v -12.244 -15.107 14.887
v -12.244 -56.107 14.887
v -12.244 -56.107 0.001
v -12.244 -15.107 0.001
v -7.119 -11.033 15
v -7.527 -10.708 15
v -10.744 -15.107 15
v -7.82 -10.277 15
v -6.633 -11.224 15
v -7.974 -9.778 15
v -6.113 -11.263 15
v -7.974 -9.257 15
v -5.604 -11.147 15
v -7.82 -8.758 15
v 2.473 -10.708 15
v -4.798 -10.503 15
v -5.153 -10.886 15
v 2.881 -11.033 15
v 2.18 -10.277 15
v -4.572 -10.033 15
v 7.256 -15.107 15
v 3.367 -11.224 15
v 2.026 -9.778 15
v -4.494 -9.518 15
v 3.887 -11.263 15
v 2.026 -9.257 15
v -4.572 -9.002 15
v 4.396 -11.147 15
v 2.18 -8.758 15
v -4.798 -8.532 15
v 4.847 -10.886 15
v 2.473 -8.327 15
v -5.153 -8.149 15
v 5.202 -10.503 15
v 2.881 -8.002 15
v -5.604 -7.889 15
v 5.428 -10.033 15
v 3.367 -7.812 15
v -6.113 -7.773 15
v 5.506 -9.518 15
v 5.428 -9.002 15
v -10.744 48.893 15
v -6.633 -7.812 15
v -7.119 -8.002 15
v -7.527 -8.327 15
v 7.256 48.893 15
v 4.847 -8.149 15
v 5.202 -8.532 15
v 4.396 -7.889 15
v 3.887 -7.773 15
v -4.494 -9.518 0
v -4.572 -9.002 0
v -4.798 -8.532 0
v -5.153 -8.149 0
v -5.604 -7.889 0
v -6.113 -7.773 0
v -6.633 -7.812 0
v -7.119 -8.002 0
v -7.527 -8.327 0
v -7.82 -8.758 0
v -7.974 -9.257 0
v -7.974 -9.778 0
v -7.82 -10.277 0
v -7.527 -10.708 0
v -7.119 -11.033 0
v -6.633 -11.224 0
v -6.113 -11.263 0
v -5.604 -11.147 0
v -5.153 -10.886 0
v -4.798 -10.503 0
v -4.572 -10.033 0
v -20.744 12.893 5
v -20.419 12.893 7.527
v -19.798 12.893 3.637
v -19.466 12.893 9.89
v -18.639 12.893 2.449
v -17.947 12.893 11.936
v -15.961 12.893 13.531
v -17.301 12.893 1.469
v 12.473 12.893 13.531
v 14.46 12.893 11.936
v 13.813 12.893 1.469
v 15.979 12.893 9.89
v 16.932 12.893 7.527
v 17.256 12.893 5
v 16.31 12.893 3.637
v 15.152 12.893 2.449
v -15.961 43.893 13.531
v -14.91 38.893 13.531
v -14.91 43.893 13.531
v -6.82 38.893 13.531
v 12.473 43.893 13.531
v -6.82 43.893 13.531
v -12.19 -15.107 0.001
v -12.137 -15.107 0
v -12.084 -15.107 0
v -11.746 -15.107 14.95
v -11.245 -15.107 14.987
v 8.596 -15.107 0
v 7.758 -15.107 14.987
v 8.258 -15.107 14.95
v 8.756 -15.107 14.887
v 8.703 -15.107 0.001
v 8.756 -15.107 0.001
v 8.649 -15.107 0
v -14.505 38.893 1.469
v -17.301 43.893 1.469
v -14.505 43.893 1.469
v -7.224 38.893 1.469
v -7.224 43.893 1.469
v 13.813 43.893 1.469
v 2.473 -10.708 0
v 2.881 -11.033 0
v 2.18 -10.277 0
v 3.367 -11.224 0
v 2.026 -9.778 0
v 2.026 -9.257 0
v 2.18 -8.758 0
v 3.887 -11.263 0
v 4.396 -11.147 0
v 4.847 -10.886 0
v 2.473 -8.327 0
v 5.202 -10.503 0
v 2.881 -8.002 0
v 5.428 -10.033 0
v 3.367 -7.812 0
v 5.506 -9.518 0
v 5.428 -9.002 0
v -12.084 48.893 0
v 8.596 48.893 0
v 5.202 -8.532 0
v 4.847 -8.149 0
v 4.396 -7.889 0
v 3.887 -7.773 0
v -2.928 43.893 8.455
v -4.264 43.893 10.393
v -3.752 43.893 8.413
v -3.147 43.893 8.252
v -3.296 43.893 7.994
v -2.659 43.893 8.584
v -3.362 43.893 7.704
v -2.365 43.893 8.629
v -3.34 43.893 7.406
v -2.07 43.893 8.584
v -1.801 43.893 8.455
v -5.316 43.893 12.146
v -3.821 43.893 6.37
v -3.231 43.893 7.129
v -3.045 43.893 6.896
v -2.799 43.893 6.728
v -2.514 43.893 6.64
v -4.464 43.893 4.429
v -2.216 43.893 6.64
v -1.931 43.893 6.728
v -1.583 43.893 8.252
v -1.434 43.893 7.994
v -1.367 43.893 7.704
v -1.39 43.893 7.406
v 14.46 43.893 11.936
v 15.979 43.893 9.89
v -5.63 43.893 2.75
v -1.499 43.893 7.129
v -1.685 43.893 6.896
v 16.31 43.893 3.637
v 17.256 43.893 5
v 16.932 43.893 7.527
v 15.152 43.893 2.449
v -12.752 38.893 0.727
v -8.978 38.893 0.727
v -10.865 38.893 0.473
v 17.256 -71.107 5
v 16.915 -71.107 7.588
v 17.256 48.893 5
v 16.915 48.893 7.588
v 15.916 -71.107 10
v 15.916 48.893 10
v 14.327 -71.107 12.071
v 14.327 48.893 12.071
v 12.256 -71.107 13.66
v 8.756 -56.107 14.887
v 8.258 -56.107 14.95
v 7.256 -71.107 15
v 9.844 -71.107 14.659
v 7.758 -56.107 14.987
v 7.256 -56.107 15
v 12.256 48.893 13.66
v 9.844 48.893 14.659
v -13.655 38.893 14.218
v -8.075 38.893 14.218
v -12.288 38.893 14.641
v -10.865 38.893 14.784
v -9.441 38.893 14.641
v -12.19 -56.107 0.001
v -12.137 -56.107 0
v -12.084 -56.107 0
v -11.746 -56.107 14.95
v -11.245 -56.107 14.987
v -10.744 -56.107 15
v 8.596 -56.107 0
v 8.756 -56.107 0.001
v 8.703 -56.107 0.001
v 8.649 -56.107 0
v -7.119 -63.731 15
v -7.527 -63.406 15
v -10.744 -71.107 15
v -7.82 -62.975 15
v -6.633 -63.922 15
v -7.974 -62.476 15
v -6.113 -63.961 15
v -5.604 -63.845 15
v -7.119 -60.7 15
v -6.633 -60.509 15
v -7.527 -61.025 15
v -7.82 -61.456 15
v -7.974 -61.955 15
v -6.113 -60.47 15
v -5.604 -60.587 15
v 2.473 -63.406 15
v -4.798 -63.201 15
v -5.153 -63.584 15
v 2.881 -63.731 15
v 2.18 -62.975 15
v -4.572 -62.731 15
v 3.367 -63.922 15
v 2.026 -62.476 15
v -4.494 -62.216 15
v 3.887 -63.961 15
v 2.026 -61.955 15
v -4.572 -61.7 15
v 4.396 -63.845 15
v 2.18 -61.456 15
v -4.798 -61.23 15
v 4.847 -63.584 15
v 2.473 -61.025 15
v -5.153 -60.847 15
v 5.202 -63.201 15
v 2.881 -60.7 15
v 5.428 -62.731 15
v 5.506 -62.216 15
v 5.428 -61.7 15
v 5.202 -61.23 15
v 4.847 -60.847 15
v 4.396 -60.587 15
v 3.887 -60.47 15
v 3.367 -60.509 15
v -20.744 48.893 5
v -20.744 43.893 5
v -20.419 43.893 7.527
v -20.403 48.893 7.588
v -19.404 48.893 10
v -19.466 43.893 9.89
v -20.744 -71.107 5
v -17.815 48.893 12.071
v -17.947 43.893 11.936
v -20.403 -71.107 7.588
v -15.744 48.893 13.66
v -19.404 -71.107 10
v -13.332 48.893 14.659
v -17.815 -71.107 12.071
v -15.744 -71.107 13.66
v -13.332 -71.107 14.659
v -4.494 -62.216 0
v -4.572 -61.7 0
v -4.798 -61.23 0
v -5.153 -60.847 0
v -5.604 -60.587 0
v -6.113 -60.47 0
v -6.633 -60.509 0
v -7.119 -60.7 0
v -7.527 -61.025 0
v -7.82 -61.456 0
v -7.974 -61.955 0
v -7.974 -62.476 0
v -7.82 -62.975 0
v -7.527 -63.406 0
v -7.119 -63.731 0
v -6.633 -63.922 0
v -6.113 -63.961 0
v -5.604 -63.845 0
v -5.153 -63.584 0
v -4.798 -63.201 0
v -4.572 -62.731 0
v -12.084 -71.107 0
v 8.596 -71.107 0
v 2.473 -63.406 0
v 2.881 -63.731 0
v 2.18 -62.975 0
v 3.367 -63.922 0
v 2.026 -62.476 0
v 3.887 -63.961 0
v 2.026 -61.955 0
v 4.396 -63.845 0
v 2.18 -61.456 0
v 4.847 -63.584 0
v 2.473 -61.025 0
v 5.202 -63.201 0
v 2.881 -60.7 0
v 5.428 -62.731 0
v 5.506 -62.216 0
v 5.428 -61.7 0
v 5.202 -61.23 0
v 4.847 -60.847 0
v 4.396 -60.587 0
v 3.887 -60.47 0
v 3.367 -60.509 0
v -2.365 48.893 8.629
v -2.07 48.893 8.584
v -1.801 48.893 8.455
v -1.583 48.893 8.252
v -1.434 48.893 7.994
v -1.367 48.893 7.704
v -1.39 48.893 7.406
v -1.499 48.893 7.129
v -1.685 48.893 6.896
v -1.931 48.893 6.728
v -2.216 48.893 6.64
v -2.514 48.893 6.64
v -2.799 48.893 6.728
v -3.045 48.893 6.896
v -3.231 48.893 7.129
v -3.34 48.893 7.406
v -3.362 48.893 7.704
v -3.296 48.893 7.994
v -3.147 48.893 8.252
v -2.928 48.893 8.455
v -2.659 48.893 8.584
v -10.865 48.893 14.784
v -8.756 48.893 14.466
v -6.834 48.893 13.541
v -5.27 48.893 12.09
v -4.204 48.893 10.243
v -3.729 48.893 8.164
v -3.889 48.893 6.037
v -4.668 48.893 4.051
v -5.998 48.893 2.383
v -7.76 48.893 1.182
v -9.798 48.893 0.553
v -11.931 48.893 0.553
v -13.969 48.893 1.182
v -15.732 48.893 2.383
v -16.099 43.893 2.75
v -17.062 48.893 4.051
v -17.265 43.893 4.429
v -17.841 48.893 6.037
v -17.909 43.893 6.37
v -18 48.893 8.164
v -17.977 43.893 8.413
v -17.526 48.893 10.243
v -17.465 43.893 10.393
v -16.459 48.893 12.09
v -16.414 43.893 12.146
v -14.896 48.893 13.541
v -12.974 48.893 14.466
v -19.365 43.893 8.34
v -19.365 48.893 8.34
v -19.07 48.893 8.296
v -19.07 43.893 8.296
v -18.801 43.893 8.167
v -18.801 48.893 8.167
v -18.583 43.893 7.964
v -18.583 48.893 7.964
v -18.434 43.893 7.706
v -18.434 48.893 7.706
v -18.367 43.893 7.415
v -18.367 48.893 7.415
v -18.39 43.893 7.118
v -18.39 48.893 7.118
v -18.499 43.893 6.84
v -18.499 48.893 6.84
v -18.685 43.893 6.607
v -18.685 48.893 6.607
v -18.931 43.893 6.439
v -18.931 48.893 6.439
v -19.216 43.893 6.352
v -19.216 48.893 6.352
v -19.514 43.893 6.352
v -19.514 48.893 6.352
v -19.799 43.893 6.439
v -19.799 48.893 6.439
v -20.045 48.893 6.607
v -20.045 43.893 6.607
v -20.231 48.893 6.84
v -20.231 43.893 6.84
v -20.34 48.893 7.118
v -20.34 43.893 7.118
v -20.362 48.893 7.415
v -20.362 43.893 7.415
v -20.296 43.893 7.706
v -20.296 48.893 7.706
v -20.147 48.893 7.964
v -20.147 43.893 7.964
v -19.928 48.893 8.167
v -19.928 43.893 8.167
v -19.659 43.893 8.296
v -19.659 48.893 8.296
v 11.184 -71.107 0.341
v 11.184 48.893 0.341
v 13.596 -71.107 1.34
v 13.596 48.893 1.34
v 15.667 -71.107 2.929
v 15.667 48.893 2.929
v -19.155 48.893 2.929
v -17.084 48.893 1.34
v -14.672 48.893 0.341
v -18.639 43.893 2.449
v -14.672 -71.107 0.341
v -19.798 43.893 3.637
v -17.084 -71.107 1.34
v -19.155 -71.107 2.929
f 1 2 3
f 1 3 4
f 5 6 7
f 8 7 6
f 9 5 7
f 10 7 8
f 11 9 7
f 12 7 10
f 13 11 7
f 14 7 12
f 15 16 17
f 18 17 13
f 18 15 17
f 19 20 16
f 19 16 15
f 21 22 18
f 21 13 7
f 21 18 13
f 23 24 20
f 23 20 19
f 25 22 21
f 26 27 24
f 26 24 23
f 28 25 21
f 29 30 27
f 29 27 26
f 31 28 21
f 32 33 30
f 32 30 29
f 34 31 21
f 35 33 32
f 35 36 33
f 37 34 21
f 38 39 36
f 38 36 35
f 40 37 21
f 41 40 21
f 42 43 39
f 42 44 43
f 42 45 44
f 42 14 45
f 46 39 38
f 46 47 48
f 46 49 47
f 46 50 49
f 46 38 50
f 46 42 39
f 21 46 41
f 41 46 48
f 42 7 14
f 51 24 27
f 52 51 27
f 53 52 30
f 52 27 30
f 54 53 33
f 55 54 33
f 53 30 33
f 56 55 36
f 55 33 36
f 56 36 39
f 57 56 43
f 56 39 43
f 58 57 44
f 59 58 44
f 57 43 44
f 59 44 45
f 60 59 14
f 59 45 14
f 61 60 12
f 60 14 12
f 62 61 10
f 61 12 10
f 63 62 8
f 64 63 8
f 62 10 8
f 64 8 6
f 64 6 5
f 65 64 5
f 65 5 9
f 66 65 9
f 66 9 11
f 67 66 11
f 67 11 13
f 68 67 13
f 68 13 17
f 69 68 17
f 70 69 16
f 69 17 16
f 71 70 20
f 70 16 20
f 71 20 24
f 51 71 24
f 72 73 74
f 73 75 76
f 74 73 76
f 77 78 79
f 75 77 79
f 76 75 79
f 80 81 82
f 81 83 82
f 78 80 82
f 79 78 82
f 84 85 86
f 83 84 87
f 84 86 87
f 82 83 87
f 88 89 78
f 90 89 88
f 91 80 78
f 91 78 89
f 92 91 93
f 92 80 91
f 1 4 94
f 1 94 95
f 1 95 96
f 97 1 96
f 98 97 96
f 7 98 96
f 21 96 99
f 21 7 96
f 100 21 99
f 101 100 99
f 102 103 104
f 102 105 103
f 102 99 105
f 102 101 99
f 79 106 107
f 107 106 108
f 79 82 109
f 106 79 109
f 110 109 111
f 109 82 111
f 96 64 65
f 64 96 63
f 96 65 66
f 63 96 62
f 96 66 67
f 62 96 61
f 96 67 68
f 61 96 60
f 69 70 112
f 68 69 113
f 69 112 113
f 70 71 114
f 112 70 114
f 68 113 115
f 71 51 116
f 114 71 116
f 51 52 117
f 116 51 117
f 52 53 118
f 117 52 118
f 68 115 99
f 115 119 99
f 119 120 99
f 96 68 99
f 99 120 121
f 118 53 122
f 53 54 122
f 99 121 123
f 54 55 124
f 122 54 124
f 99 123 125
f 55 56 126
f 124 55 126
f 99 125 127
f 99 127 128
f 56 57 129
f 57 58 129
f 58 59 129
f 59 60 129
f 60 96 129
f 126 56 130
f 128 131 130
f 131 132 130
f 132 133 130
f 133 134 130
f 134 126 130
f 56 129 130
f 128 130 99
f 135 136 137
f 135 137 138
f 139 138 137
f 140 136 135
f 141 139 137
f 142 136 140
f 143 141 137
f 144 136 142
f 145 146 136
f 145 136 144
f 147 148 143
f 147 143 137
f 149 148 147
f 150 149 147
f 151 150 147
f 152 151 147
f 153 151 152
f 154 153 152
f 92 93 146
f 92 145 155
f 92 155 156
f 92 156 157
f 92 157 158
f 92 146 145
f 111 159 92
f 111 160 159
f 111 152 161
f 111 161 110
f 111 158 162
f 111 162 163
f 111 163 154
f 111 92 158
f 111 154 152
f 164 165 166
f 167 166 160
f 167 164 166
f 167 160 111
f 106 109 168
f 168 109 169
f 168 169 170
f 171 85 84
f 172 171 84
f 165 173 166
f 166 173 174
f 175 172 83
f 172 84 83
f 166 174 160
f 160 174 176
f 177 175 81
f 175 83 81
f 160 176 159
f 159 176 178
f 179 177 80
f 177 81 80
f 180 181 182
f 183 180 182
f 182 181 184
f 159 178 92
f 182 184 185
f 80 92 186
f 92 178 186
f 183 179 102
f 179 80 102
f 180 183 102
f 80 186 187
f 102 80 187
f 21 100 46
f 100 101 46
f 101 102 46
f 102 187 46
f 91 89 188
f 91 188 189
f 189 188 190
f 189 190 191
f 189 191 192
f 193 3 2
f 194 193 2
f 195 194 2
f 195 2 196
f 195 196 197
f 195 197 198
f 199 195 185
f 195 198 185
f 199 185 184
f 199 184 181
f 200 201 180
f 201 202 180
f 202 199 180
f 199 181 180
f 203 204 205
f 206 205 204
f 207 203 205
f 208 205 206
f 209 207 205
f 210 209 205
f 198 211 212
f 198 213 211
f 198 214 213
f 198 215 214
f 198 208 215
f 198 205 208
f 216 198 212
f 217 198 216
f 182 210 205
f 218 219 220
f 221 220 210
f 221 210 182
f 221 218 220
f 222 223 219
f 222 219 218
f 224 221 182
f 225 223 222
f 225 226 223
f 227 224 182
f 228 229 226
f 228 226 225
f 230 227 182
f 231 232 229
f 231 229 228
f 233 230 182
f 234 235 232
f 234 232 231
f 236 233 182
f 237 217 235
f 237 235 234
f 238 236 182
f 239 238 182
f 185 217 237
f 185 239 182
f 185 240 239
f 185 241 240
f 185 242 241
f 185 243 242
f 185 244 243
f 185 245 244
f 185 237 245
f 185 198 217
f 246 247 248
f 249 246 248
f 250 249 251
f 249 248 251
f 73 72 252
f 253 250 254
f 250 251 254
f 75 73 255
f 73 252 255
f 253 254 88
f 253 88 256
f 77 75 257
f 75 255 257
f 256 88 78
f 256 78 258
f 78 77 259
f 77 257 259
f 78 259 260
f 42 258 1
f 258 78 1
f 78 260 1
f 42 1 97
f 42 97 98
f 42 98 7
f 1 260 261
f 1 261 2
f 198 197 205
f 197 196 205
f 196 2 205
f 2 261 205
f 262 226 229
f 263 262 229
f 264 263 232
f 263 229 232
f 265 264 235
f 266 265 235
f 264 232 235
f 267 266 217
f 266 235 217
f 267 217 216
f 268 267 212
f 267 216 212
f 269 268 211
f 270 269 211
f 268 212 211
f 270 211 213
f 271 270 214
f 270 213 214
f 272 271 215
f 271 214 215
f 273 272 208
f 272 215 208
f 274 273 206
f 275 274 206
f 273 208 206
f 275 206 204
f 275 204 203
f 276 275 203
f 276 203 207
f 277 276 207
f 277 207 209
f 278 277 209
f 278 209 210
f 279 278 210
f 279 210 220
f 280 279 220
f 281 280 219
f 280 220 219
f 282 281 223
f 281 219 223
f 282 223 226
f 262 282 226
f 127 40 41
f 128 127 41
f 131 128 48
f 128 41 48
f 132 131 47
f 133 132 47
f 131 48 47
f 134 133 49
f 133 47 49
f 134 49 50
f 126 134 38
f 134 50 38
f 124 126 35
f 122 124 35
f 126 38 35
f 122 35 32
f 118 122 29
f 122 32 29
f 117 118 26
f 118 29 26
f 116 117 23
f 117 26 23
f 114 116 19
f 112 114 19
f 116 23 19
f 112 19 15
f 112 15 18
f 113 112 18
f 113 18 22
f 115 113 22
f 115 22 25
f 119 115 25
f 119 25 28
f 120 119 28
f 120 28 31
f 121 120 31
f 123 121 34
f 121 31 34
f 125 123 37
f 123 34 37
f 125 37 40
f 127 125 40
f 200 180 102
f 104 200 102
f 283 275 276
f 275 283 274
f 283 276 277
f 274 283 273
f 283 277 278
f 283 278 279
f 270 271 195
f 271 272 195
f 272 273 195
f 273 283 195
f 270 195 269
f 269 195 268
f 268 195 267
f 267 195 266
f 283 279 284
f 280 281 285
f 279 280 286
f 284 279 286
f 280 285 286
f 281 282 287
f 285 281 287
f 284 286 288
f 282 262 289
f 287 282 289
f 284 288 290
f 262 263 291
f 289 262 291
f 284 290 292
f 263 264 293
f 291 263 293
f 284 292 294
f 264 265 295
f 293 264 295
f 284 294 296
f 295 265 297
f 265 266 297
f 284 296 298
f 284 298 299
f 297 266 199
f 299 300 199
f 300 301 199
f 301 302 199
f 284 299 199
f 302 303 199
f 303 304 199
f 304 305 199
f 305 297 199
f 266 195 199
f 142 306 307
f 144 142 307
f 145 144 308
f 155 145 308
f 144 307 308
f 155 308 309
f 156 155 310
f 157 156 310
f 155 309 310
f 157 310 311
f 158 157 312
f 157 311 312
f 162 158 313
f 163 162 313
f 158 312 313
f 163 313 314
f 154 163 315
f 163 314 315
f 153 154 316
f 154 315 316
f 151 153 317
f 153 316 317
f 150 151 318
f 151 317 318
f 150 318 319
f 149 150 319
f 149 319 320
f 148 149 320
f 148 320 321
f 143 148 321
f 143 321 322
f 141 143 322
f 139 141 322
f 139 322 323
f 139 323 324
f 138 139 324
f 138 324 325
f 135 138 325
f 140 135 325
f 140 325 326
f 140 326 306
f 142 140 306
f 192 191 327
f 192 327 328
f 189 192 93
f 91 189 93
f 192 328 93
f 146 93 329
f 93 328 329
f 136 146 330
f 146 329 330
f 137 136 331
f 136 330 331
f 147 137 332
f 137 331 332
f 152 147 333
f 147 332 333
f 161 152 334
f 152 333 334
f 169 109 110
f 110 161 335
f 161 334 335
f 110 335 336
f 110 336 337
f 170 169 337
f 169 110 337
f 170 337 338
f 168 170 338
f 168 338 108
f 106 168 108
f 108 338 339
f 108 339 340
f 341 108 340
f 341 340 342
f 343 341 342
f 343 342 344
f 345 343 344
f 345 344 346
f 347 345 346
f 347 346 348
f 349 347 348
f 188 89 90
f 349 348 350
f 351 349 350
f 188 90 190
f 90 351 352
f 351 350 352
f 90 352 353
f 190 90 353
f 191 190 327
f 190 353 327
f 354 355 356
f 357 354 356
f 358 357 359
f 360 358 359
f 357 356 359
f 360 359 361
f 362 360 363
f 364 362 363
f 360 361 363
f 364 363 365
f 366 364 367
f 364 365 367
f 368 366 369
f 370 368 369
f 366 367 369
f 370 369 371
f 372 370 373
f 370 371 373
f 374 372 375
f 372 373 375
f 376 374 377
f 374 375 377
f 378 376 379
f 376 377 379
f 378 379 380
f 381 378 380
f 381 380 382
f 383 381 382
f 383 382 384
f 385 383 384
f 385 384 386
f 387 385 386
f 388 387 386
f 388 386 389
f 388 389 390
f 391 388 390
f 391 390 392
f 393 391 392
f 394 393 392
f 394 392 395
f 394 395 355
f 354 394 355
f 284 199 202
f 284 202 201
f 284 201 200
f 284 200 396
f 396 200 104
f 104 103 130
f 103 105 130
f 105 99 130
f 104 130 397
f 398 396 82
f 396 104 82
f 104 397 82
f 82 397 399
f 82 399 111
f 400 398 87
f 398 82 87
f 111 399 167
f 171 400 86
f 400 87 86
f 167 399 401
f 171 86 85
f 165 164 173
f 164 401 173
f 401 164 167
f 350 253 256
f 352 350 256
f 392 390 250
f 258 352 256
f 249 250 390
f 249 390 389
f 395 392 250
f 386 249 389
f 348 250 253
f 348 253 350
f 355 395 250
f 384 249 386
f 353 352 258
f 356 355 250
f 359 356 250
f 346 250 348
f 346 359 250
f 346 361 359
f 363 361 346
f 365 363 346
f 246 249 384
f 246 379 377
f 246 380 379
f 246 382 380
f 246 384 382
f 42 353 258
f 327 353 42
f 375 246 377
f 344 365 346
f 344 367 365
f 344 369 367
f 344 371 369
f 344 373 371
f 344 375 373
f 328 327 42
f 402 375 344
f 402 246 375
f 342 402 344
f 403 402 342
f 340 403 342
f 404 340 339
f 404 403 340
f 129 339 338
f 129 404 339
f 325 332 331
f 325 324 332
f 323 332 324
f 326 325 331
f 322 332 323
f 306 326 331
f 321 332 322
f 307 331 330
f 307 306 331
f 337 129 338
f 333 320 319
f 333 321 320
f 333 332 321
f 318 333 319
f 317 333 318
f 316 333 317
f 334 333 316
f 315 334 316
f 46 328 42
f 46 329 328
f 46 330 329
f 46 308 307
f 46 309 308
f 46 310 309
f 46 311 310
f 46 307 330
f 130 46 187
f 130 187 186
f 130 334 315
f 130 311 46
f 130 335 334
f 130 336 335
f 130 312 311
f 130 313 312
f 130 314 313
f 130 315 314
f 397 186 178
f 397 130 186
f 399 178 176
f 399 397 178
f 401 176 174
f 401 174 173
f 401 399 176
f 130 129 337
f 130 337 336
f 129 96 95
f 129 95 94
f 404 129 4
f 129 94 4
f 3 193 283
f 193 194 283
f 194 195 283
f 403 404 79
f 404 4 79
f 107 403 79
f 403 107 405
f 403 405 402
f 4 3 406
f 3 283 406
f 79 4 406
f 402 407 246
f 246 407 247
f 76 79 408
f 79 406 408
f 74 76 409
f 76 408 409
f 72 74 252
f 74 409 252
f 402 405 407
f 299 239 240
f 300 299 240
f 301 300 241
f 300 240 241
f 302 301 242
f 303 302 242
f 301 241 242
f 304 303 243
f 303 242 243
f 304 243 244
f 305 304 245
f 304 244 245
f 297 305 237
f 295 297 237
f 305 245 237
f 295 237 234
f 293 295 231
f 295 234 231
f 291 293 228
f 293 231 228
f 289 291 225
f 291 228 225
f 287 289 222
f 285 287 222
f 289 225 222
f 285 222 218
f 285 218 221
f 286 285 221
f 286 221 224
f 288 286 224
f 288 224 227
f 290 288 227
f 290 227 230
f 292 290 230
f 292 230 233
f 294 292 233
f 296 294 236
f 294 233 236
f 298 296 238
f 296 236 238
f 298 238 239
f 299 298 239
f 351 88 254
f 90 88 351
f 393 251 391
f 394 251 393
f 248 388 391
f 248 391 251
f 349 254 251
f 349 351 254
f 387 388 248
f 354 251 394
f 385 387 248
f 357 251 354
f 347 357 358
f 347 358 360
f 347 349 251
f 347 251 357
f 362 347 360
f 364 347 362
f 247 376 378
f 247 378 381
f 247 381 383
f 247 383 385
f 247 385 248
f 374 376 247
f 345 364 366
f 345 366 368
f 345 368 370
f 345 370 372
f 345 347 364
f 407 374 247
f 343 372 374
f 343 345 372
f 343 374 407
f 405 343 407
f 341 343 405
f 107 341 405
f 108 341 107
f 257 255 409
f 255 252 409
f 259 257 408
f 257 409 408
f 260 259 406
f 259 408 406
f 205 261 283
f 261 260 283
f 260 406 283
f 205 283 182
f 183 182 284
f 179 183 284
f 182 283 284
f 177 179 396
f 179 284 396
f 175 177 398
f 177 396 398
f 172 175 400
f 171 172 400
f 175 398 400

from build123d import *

# Parameters (mm, degrees)
SKETCH1_W           = 38
SKETCH1_H           = 120
BOSS_EXTRUDE1_DEPTH = 15
SKETCH2_W           = 21
SKETCH2_H           = 41
CUT_EXTRUDE2_DEPTH  = 15
SKETCH3_R           = 1.75
CUT_EXTRUDE4_DEPTH  = 15
SKETCH6_W           = 12.0625825
SKETCH6_H           = 31
CUT_EXTRUDE8_DEPTH  = 38
SKETCH8_R           = 7.155544399
SKETCH8_R_2         = 1
CUT_EXTRUDE10_DEPTH = 10
FILLET2_R           = 10
FILLET3_R           = 10


with BuildPart() as part:
    # Sketch1 → Boss-Extrude1 (new body)
    with BuildSketch(Plane.XY):
        with Locations((-1.743801653, -11.107438017)):
            Rectangle(SKETCH1_W, SKETCH1_H)
    extrude(amount=BOSS_EXTRUDE1_DEPTH)

    # Sketch2 → Cut-Extrude2 (cut)
    with BuildSketch(Plane.XY.offset(15)):
        with Locations((-1.743801653, -35.607438017)):
            Rectangle(SKETCH2_W, SKETCH2_H)
    extrude(amount=-CUT_EXTRUDE2_DEPTH, mode=Mode.SUBTRACT)

    # Sketch3 → Cut-Extrude4 (cut)
    with BuildSketch(Plane.XY.offset(15)):
        with Locations((-6.243801653, -9.517630565)):
            Circle(SKETCH3_R)
        with Locations((3.756198347, -9.517630565)):
            Circle(SKETCH3_R)
        with Locations((-6.243801653, -62.215563881)):
            Circle(SKETCH3_R)
        with Locations((3.756198347, -62.215563881)):
            Circle(SKETCH3_R)
    extrude(amount=-CUT_EXTRUDE4_DEPTH, mode=Mode.SUBTRACT)

    # Sketch6 → Cut-Extrude8 (cut)
    with BuildSketch(Plane(origin=(17.256198347, 0, 0), x_dir=(0, 0, -1), z_dir=(1, 0, 0))):
        with Locations((-7.5, 28.392561983)):
            Rectangle(SKETCH6_W, SKETCH6_H)
    extrude(amount=-CUT_EXTRUDE8_DEPTH, mode=Mode.SUBTRACT)

    # Sketch8 → Cut-Extrude10 (cut)
    with BuildSketch(Plane(origin=(0, 48.892561983, 0), x_dir=(1, 0, 0), z_dir=(0, 1, 0))):
        with Locations(Location((-10.864699175, -7.628809465, 0), (0, 0, 270))):
            Circle(SKETCH8_R)
        with Locations(Location((-19.364699175, -7.340375333, 0), (0, 0, 270))):
            Circle(SKETCH8_R_2)
        with Locations(Location((-2.364699175, -7.628809465, 0), (0, 0, 270))):
            Circle(SKETCH8_R_2)
    extrude(amount=-CUT_EXTRUDE10_DEPTH, mode=Mode.SUBTRACT)

    # Fillet2
    # the kernel refuses this fillet: 10 mm, written as the material it takes off along each edge
    with BuildSketch(Plane(origin=(-20.743801653, -96.107438017, 15), x_dir=(0, 0, -1), z_dir=(0, 1, 0))) as fillet2_piece_1:
        with BuildLine():
            CenterArc((FILLET2_R, -FILLET2_R), FILLET2_R, 90, 90)
            Line((0, -FILLET2_R), (0, 0))
            Line((0, 0), (FILLET2_R, 0))
        make_face()
    extrude(amount=170, mode=Mode.SUBTRACT)
    with BuildSketch(Plane(origin=(17.256198347, 73.892561983, 15), x_dir=(-1, 0, 0), z_dir=(0, -1, 0))) as fillet2_piece_2:
        with BuildLine():
            CenterArc((FILLET2_R, FILLET2_R), FILLET2_R, 180, 90)
            Line((0, FILLET2_R), (0, 0))
            Line((0, 0), (FILLET2_R, 0))
        make_face()
    extrude(amount=170, mode=Mode.SUBTRACT)

    # Fillet3
    # the kernel refuses this fillet: 10 mm, written as the material it takes off along each edge
    with BuildSketch(Plane(origin=(-20.743801653, -92.758073111, 0), x_dir=(1, 0, 0), z_dir=(0, 1, 0)), Plane(origin=(17.256198347, 70.543197078, 0), x_dir=(-1, 0, 0), z_dir=(0, -1, 0))) as fillet3_piece_1:
        with BuildLine():
            CenterArc((8.660254038, -10), FILLET3_R, 90, 60)
            Line((0, -5), (-0.173205081, -4.9))
            ThreePointArc((-0.173205081, -4.9), (-0.2, -2.5), (-0.2, 0))
            Line((-0.2, 0), (0, 0.2))
            Line((0, 0.2), (8.660254038, 0.2))
            Line((8.660254038, 0.2), (8.660254038, 0))
        make_face()
    extrude(amount=163.301270189, mode=Mode.SUBTRACT)


solid = part.part
